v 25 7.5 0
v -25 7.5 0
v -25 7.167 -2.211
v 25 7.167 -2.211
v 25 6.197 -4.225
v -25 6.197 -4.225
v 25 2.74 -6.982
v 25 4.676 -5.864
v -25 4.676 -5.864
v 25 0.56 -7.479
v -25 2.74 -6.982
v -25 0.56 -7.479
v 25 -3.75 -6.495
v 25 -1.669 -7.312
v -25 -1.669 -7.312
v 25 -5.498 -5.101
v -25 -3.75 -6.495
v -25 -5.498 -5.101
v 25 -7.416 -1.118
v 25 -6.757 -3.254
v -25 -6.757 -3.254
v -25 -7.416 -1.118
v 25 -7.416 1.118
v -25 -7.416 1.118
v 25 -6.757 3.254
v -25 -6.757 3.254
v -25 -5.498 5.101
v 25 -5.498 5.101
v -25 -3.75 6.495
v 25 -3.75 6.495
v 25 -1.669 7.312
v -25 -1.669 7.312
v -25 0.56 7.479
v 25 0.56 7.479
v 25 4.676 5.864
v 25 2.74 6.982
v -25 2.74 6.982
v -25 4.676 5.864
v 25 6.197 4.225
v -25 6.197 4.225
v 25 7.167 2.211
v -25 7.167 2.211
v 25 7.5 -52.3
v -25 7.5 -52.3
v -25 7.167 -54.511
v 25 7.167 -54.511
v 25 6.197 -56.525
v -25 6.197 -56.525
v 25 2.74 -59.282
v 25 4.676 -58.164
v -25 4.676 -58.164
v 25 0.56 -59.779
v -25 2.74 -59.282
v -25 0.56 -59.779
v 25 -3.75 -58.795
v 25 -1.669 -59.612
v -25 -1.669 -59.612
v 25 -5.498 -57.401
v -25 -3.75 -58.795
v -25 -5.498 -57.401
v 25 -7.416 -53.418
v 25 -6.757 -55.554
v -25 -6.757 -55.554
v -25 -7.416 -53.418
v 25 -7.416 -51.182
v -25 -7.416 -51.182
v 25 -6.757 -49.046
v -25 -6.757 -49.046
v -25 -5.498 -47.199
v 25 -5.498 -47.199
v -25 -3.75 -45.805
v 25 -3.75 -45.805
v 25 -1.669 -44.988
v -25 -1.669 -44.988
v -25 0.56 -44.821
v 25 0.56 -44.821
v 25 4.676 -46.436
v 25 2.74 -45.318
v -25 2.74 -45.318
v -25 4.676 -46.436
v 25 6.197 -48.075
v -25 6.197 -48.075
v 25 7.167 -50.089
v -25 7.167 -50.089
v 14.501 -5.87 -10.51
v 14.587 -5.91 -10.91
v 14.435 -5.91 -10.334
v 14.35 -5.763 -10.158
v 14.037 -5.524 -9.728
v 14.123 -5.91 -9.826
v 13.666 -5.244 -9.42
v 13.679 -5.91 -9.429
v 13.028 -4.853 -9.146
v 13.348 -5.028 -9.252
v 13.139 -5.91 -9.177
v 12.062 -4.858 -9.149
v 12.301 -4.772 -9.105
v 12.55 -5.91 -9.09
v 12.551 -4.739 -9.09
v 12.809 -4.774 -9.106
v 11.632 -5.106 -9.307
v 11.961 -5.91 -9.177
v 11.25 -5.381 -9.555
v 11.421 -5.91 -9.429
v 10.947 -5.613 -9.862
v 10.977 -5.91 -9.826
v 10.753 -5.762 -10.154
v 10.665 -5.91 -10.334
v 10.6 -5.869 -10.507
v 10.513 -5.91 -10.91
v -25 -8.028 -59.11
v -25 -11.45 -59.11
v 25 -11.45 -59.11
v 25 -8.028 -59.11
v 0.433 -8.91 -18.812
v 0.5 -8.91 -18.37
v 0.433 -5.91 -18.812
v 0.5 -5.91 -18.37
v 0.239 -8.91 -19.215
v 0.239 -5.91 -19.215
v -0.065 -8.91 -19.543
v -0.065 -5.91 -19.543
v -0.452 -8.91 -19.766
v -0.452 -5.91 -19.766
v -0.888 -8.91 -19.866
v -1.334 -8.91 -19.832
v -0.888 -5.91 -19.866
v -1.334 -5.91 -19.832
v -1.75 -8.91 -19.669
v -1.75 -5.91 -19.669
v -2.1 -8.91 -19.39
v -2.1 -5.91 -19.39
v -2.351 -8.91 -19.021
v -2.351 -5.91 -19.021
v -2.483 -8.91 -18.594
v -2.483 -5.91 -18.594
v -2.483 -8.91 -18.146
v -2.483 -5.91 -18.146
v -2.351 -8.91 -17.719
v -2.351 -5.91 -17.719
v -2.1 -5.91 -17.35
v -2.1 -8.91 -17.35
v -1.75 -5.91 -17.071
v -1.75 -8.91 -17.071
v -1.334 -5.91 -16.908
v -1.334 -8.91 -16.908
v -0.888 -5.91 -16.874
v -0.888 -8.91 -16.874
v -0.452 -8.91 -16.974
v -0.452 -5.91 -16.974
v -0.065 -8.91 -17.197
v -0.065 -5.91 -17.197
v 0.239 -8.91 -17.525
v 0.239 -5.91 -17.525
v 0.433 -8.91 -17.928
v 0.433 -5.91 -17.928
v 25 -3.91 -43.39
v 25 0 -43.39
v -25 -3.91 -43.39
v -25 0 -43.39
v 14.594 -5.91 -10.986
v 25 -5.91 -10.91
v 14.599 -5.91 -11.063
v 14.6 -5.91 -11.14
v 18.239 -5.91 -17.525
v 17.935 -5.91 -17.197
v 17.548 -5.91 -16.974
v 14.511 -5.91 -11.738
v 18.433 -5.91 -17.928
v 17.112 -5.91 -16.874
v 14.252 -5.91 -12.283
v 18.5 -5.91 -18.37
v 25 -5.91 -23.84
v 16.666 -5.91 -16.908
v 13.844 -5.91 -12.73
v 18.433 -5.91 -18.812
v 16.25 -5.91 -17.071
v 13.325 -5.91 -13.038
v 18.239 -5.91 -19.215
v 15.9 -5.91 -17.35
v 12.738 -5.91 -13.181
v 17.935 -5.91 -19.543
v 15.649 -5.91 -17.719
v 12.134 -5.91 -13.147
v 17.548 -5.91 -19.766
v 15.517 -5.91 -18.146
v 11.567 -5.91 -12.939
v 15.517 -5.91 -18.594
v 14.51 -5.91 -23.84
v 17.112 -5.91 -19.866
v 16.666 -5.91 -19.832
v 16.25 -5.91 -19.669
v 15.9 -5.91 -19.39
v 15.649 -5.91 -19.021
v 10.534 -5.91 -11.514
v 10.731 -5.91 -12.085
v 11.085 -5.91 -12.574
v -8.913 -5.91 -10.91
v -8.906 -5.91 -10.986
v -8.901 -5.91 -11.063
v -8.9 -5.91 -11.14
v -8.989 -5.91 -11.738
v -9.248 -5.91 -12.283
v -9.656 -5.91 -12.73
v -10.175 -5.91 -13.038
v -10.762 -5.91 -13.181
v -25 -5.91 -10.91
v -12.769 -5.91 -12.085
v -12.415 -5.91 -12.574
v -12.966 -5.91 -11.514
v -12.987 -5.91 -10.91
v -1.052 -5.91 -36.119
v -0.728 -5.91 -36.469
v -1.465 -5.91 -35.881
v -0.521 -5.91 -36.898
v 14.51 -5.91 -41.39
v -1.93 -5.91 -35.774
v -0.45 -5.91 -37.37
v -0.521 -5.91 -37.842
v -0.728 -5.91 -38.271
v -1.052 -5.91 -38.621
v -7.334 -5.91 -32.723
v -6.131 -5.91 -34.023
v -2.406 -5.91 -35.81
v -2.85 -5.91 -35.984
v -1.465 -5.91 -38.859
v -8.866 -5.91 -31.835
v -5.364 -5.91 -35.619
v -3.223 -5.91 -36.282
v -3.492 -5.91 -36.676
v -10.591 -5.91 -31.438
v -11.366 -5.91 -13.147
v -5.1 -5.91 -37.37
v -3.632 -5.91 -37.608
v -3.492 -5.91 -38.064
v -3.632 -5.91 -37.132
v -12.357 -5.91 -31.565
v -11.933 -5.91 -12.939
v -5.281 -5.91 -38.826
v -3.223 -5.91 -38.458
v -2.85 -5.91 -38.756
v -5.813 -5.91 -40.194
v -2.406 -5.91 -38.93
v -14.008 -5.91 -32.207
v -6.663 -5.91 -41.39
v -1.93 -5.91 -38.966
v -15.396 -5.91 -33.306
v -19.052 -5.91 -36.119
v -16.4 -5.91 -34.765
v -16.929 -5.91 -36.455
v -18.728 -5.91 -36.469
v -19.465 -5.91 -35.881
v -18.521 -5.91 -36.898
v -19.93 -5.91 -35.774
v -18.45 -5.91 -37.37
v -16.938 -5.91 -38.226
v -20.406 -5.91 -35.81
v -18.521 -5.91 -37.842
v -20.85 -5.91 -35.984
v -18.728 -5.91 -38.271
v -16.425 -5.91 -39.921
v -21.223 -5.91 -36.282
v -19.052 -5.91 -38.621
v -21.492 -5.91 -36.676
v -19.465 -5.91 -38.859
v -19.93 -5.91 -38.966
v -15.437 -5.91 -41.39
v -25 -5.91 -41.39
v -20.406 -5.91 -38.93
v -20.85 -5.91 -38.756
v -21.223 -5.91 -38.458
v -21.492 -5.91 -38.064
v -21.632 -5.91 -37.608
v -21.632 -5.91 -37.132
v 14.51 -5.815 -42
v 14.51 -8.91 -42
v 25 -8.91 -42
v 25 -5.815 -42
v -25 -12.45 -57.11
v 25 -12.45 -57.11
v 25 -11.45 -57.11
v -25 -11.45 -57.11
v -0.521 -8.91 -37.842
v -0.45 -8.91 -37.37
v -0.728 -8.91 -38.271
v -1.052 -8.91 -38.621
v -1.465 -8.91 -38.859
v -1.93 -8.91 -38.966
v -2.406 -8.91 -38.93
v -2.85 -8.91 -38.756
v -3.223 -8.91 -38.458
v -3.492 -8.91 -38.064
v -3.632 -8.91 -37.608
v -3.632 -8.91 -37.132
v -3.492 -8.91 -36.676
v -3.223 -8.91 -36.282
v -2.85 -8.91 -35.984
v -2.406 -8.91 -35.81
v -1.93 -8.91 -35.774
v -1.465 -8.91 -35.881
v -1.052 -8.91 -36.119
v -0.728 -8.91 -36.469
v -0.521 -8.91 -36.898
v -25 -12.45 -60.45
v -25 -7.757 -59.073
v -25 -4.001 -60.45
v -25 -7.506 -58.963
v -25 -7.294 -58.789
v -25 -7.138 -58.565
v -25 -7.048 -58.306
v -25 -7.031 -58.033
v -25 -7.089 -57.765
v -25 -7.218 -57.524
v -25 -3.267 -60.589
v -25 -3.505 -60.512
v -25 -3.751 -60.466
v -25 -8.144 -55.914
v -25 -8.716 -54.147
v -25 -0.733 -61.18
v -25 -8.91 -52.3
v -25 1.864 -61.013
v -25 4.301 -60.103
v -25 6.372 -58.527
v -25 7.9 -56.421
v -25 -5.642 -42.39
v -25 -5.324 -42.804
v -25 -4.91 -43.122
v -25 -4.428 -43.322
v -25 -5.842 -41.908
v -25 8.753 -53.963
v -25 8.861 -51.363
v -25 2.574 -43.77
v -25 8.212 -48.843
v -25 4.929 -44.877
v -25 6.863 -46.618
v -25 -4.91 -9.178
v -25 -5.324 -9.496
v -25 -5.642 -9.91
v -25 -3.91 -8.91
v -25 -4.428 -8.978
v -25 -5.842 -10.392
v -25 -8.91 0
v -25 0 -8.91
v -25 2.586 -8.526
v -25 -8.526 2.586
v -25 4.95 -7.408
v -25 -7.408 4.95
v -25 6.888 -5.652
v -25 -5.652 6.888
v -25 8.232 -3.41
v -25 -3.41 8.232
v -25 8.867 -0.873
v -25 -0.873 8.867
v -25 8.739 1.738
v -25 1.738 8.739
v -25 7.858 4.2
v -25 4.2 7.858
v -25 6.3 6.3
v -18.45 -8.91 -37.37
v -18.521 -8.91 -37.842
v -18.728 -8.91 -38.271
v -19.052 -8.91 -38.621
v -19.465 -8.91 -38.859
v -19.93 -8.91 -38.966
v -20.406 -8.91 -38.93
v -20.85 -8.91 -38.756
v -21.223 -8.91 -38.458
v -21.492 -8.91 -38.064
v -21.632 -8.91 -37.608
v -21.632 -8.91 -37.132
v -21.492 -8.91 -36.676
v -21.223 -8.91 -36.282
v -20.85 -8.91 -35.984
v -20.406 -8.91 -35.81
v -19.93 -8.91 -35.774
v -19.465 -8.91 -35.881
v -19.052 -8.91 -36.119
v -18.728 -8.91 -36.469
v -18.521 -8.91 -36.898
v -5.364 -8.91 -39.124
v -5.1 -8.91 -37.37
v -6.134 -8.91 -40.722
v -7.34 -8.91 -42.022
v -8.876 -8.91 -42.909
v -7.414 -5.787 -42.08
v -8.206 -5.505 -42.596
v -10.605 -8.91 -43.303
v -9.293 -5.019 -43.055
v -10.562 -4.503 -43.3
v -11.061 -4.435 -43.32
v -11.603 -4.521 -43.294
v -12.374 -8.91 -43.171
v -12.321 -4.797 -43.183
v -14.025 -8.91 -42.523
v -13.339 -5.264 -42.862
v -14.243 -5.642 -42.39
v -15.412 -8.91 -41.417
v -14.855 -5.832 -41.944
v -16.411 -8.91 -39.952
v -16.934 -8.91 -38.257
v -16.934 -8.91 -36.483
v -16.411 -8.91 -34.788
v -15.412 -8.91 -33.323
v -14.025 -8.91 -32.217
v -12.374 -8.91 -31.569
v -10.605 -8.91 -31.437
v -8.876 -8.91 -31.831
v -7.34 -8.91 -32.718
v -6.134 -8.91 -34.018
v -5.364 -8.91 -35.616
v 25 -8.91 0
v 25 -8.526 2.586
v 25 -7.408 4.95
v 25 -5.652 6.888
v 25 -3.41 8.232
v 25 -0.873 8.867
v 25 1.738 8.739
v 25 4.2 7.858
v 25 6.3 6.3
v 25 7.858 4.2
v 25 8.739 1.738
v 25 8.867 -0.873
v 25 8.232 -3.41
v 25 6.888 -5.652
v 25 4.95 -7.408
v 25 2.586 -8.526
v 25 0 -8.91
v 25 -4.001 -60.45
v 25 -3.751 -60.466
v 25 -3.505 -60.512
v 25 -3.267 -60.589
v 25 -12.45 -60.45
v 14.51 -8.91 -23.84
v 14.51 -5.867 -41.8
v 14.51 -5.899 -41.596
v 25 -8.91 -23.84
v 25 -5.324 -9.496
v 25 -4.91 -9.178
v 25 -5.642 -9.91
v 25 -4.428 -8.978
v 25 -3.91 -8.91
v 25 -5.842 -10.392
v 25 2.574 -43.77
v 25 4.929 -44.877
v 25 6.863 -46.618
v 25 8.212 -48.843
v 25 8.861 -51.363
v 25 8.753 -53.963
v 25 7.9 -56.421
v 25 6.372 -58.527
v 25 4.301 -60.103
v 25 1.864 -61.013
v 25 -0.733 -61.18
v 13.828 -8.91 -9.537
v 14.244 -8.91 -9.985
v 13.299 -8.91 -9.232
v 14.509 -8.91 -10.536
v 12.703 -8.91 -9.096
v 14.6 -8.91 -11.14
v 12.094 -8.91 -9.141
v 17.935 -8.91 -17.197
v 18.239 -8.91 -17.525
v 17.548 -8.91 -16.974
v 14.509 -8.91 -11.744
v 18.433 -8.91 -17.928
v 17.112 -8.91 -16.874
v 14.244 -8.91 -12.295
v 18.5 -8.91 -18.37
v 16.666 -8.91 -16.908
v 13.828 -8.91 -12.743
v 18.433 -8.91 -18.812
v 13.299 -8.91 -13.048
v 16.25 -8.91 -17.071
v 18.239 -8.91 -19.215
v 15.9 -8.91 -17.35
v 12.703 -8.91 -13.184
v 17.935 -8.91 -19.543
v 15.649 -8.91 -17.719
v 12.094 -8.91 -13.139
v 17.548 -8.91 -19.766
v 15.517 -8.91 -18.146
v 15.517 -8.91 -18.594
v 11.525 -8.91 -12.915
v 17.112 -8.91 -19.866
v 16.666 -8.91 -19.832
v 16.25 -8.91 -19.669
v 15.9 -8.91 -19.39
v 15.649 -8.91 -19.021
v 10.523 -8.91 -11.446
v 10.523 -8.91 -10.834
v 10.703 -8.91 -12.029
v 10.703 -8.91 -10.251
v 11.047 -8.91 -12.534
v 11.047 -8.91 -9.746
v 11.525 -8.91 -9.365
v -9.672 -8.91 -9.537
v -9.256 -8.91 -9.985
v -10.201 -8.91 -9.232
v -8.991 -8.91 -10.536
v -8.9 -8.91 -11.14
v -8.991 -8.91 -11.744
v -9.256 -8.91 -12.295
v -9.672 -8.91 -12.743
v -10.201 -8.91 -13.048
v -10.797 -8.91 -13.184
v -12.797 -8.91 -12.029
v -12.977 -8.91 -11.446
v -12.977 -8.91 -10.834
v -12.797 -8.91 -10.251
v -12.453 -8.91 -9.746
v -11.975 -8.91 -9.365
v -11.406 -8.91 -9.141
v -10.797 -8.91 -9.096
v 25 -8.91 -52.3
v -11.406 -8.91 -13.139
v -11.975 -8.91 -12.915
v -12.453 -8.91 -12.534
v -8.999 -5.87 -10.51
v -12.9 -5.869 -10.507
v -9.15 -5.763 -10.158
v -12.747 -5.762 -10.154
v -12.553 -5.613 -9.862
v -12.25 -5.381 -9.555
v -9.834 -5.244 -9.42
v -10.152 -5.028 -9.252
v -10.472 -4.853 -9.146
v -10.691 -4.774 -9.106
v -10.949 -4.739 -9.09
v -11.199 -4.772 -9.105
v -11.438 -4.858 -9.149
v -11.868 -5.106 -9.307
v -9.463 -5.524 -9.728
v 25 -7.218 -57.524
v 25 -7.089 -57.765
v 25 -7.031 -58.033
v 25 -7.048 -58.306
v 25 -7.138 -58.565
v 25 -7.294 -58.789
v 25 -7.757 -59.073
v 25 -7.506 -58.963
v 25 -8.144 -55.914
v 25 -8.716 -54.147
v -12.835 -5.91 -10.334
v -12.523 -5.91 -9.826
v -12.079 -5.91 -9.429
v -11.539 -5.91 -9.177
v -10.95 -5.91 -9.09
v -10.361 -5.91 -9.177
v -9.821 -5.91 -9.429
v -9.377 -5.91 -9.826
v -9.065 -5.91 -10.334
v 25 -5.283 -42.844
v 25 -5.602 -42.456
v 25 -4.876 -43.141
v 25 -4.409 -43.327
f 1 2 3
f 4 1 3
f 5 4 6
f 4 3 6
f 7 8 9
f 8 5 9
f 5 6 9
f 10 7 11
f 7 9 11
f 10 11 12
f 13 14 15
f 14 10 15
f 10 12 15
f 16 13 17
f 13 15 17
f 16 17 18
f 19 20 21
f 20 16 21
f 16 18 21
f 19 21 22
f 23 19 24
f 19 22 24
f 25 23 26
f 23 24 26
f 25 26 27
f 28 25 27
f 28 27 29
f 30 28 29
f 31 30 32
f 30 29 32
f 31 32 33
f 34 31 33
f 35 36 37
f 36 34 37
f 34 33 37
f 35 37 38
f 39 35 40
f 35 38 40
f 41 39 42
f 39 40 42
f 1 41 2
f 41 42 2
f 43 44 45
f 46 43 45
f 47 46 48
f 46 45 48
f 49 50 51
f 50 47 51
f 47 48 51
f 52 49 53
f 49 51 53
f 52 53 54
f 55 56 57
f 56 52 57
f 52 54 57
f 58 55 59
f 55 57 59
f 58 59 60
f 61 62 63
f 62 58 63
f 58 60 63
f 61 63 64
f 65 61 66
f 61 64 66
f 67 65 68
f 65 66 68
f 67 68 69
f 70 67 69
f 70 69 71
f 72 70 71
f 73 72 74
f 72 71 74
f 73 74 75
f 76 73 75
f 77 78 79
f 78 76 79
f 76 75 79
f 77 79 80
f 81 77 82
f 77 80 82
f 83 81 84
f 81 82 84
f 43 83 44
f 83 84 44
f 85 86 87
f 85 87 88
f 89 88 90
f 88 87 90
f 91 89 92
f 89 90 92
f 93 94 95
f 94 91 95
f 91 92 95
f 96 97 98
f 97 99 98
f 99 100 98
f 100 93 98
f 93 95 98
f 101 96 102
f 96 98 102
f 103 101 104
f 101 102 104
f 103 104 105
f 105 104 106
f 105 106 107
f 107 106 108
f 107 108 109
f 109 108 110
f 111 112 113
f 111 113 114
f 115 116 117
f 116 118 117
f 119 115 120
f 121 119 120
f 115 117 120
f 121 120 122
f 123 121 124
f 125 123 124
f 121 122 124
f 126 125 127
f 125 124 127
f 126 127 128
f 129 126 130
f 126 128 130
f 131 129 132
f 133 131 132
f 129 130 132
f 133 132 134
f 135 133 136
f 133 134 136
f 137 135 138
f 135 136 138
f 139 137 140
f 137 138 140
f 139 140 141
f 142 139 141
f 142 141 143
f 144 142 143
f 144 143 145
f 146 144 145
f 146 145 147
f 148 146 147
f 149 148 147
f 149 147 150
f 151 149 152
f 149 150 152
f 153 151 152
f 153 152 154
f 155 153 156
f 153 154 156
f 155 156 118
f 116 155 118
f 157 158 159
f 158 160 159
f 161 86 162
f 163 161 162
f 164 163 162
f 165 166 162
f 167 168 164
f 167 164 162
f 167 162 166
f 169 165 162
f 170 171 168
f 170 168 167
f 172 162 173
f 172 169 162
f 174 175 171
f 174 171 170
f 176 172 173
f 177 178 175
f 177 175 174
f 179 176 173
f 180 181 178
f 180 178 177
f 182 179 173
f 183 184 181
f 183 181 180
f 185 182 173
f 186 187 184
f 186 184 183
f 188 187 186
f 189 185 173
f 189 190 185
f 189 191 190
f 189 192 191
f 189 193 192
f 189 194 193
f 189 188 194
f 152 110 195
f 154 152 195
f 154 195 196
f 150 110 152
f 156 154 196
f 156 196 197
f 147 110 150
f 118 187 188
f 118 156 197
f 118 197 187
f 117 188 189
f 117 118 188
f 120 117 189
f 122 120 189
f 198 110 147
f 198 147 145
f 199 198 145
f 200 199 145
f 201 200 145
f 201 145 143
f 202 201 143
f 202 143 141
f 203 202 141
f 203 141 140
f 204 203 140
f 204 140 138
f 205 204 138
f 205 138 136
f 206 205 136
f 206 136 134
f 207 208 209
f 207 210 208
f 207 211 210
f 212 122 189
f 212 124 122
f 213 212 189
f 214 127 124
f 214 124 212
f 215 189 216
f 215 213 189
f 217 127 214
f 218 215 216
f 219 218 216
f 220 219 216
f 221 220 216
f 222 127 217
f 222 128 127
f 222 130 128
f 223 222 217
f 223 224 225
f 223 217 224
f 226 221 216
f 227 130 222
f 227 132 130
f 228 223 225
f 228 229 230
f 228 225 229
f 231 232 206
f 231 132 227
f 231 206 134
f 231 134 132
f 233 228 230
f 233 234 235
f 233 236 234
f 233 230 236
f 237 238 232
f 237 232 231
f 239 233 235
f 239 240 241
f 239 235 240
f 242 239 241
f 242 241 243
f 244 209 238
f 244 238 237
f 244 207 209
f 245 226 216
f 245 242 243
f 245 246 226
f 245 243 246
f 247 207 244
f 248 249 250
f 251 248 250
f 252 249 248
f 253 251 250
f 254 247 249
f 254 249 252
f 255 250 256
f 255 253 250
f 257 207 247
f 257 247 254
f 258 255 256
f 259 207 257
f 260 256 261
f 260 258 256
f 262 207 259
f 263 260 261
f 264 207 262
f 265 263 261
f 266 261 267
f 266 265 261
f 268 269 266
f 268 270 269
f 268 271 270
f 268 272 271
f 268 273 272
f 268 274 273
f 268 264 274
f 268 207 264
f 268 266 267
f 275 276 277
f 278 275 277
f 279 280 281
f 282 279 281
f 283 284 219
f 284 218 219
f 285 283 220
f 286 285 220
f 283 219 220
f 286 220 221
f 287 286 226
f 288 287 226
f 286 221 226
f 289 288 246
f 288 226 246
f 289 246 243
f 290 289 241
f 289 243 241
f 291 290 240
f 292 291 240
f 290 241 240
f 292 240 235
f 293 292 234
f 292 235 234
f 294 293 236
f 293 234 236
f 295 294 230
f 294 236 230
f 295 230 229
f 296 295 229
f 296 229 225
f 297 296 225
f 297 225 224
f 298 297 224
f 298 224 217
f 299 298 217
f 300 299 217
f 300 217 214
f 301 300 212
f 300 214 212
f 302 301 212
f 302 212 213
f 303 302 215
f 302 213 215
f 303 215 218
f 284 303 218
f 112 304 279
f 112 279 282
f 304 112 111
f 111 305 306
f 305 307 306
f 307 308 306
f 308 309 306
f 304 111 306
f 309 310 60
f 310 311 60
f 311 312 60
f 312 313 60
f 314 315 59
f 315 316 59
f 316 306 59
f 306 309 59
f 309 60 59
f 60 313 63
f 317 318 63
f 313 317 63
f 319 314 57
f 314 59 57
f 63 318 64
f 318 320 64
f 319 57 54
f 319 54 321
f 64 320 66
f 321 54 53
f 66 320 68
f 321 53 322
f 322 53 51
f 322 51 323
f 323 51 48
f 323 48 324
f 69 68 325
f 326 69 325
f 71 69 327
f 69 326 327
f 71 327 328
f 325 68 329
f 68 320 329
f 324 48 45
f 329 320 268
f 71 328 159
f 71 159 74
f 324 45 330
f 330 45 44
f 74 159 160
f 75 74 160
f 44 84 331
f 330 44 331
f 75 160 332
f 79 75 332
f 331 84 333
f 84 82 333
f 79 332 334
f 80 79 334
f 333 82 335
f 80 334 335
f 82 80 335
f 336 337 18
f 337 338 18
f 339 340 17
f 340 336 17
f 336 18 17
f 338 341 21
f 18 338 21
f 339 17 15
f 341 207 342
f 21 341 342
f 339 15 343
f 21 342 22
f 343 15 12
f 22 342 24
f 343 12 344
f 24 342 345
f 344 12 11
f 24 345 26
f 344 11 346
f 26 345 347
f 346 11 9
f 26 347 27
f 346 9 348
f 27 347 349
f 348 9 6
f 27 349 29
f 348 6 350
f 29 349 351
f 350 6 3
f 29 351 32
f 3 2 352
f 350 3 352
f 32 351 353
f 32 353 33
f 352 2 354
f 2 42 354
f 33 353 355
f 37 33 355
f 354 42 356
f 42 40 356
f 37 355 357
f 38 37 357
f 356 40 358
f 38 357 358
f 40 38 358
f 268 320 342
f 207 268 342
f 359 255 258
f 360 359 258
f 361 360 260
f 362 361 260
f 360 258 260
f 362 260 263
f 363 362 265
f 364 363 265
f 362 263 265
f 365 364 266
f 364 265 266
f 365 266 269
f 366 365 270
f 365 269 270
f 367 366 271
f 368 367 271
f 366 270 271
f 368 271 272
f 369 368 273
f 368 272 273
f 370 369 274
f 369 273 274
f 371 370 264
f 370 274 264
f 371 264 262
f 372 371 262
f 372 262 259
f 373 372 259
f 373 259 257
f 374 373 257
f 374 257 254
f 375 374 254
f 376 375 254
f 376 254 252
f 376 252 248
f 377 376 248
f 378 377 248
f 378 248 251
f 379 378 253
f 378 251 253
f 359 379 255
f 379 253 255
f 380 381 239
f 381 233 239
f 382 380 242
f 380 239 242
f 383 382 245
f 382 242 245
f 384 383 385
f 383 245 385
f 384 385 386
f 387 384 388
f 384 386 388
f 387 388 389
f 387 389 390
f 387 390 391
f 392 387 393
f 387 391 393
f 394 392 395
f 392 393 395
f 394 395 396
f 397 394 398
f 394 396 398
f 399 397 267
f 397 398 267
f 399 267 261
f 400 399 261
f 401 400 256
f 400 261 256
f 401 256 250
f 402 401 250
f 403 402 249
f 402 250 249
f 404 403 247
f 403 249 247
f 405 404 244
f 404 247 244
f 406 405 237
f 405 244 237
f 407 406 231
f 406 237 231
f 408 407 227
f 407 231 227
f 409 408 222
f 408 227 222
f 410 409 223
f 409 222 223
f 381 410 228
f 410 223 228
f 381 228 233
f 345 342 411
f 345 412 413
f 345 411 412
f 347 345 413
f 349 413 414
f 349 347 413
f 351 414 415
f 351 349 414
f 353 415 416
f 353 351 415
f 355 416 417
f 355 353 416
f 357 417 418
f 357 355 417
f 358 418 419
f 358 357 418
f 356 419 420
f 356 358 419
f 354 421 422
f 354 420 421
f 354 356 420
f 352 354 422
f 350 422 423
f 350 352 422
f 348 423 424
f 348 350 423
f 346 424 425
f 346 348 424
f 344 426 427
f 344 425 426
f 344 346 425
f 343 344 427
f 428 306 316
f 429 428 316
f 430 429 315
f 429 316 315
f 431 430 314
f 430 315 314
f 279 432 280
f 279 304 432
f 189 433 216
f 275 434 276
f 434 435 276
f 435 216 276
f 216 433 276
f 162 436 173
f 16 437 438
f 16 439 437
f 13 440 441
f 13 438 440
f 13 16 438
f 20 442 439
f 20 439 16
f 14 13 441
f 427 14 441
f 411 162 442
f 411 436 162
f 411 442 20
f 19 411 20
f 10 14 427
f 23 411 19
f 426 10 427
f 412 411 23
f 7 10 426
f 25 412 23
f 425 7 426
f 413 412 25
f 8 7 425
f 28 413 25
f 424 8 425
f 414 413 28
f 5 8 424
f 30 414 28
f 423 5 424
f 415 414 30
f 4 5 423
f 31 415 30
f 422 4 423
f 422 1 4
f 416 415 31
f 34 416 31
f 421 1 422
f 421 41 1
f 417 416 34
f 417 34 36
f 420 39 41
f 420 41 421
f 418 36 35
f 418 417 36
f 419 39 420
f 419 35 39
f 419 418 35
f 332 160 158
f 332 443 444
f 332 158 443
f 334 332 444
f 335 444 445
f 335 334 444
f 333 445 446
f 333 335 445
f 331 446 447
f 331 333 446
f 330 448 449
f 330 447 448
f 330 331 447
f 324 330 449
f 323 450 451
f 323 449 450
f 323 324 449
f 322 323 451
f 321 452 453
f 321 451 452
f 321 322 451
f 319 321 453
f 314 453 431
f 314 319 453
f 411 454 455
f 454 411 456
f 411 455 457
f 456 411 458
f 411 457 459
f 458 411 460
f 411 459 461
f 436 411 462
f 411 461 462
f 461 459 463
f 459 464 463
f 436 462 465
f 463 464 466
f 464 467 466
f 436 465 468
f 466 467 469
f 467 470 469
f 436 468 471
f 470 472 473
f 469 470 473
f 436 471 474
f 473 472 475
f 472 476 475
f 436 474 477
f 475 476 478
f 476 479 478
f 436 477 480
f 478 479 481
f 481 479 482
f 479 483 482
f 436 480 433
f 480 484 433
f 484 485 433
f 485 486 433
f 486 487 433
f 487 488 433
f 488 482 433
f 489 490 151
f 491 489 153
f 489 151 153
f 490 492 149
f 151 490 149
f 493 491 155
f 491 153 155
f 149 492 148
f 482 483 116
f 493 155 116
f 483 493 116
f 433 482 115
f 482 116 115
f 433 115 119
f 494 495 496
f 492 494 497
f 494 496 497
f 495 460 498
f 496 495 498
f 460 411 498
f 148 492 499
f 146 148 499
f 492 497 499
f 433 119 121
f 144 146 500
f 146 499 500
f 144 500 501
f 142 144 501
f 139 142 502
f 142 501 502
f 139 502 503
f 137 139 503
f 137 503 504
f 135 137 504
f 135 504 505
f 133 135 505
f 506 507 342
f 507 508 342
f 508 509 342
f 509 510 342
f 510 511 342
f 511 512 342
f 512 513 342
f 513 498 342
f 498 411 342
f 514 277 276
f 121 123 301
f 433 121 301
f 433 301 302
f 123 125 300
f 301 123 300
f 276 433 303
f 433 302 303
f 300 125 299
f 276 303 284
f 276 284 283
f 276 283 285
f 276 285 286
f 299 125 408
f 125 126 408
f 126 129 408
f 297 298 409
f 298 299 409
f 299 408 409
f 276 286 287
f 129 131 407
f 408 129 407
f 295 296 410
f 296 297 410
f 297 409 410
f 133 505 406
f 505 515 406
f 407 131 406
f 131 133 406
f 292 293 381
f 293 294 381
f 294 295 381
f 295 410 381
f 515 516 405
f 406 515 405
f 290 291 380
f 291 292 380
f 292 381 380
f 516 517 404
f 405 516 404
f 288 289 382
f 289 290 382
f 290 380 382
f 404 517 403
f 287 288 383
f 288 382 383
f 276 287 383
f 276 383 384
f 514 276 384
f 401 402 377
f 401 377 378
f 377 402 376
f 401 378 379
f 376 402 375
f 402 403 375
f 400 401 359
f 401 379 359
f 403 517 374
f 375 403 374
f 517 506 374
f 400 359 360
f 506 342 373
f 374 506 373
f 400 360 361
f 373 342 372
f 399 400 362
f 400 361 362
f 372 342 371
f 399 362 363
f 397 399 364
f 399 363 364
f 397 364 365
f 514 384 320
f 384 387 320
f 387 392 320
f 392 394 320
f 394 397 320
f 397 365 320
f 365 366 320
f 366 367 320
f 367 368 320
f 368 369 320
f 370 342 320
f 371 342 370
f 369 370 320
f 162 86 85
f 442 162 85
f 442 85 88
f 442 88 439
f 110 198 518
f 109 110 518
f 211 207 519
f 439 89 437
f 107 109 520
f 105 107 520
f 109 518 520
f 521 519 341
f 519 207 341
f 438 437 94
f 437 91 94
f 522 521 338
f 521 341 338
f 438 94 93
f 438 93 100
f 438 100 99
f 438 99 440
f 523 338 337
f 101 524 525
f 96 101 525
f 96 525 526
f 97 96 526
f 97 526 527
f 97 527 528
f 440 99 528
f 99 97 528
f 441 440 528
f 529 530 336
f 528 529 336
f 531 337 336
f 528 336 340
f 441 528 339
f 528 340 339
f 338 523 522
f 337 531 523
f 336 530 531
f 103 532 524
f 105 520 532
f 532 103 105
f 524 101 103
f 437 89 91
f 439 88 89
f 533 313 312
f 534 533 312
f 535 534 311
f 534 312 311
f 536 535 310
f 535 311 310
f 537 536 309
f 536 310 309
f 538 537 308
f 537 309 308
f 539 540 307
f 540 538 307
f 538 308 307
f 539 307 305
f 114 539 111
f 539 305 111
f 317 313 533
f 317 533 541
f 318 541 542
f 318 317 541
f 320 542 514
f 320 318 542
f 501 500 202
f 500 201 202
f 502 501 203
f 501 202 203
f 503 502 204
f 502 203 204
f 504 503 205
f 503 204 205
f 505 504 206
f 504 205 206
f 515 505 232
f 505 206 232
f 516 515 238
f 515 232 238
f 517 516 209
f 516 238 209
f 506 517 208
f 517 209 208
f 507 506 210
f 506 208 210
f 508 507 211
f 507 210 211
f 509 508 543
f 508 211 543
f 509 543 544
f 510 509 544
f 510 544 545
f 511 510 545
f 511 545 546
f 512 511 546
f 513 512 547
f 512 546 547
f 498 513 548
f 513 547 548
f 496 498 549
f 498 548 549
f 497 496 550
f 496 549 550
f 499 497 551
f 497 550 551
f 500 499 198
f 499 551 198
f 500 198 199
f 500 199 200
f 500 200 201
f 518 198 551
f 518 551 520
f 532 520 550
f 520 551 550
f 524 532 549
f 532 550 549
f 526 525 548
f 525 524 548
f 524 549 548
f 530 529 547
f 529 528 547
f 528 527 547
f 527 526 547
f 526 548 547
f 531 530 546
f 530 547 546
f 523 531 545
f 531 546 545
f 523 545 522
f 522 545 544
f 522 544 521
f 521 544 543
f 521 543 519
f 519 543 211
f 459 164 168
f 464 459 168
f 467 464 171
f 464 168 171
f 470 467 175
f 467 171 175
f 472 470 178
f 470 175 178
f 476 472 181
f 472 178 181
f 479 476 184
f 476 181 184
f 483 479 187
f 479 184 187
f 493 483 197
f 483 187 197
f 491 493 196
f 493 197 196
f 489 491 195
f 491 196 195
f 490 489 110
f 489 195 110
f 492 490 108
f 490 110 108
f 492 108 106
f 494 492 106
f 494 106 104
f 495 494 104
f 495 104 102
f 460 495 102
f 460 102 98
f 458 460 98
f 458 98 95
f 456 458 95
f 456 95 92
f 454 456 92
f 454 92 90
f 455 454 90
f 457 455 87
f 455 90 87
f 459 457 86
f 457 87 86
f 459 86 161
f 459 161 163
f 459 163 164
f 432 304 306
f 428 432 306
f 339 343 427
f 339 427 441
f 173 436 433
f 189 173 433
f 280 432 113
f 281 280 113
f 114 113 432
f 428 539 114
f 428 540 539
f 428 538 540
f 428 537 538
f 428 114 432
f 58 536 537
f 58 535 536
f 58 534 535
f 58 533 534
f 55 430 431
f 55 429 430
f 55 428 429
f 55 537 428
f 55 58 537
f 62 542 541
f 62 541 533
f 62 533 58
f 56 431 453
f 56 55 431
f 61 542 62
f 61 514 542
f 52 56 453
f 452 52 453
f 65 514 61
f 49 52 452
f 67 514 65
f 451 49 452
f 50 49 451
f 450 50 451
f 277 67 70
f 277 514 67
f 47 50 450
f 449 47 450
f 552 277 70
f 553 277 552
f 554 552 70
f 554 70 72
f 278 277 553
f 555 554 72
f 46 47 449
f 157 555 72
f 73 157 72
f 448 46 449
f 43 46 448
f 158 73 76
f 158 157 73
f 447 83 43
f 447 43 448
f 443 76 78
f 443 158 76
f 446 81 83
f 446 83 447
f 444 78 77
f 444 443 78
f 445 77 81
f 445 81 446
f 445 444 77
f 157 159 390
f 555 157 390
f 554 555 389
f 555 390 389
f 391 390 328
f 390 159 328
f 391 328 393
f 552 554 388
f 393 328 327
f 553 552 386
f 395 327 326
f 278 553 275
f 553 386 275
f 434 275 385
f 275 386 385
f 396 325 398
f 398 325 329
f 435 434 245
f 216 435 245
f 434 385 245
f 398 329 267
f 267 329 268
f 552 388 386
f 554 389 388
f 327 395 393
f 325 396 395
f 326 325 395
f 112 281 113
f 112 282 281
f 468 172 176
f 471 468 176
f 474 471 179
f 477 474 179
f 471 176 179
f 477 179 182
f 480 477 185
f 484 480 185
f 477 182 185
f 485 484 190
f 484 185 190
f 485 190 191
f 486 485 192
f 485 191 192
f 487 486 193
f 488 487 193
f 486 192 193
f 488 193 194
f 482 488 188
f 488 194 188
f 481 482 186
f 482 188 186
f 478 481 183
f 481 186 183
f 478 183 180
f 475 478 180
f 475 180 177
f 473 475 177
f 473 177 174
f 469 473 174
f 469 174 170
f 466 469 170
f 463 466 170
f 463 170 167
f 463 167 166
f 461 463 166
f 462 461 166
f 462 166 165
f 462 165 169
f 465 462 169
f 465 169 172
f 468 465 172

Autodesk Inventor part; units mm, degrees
ref_plane "YZ Plane" through (0, 0, 0) normal (1, 0, 0) x (0, 1, 0)
ref_plane "XZ Plane" through (0, 0, 0) normal (0, 1, 0) x (-1, 0, 0)
ref_plane "XY Plane" through (0, 0, 0) normal (0, 0, 1) x (1, 0, 0)
sketch "Эскиз1" plane through (0, 0, 0) normal (1, 0, 0) x (0, 1, 0)
  line L0 (0, 0) -> (143.27187, 0) construction
  line L1 (0, 0) -> (0, -170.504512) construction
  arc A0 (0, -8.91) -> (-8.91, 0) centre (0, 0) ccw
  circle A1 centre (0, -52.3) radius 7.5
  circle A2 centre (0, 0) radius 7.5
  line L2 (-8.91, 0) -> (-8.91, -52.3)
  line L3 (-5.91, -10.91) -> (-5.91, -41.39)
  line L4 (0, -8.91) -> (-3.91, -8.91)
  line L5 (0, -43.39) -> (-3.91, -43.39)
  line L6 (-12.45, -60.45) -> (-12.45, -57.11)
  line L7 (-12.45, -57.11) -> (-11.45, -57.11)
  line L8 (-11.45, -57.11) -> (-11.45, -59.11)
  line L9 (-11.45, -59.11) -> (-8.0282, -59.11)
  arc A3 (-8.91, -52.3) -> (-7.218089, -57.523724) centre (0, -52.3) ccw
  arc A4 (-3.267299, -60.589322) -> (0, -43.39) centre (0, -52.3) ccw
  circle A5 centre (0, 0) radius 4 construction
  line L10 (0, 4) -> (-17.853128, 4) construction
  line L11 (-17.853128, 4) -> (-17.853128, -60.45) construction
  line L12 (-17.853128, -60.45) -> (-12.45, -60.45) construction
  line L13 (-12.45, -60.45) -> (-4.0007, -60.45)
  arc A6 (-8.0282, -59.11) -> (-7.218089, -57.523724) centre (-8.0282, -58.11) ccw
  arc A7 (-5.91, -41.39) -> (-3.91, -43.39) centre (-3.91, -41.39) ccw
  arc A8 (-3.91, -8.91) -> (-5.91, -10.91) centre (-3.91, -10.91) ccw
  arc A9 (-3.267299, -60.589322) -> (-4.0007, -60.45) centre (-4.0007, -62.45) ccw
  point P0 (-5.91, -43.39)
  point P1 (-5.91, -8.91)
  point P2 (0, -61.21)
  point P3 (-5.745607, -59.11)
  point P4 (-3.600778, -60.45)
  dimension "d34" = 8
  dimension "d0" = 17.82
  dimension "d2" = 15
  dimension "d3" = 15
  dimension "d4" = 52.3
  dimension "d5" = 3
  dimension "d9" = 1
  dimension "d11" = 8.91
  dimension "d12" = 8.91
  dimension "d13" = 3.54
  dimension "d35" = 64.45
  dimension "d36" = 3.34
  dimension "d37" = 1.34
  dimension "d38" = 1
  dimension "d39" = 2
  dimension "d40" = 2
  dimension "d41" = 2
  dimension "d42" = 63.11
  dimension "d43" = 70.12
extrude "Выдавливание1" add sketch "Эскиз1" along normal mid plane 50
sketch "Эскиз2" plane through (-25, -5.91, -8.91) normal (0, 1, 0) x (1, 0, 0)
  circle A0 centre (13.95, 28.46) radius 5.95
  line L0 (4.95, 28.46) -> (13.95, 28.46) construction
  line L1 (13.95, 28.46) -> (24.436318, 28.46) construction
  circle A1 centre (4.95, 28.46) radius 1.6
  circle A2 centre (22.95, 28.46) radius 1.6
  line L2 (13.95, 28.46) -> (13.95, 32.27883)
  circle A3 centre (4.95, 28.46) radius 1.455 construction
  circle A4 centre (22.95, 28.46) radius 1.455 construction
  line L3 (0, 5.642815) -> (0, 38.122815) construction
  line L4 (50, -8.91) -> (50, 43.39) construction
  line L5 (50, 14.93) -> (39.51, 14.93)
  line L6 (39.51, 14.93) -> (39.51, 33.09)
  line L7 (39.51, 33.09) -> (50, 33.09)
  line L8 (50, 33.09) -> (50, 14.93)
  line L9 (0, -18.82) -> (50, -18.82) construction
  line L10 (50, 43.39) -> (2.383382, 43.39)
  line L11 (50, -17.82) -> (50, 0)
  line L12 (50, -17.82) -> (50, 0)
  line L13 (50, -8.91) -> (53.294914, -8.91)
  line L14 (50, -12.91) -> (54.162489, -12.91)
  line L15 (0, 52.3) -> (50, 52.3)
  dimension "d15" = 3.2
  dimension "d16" = 3.2
  dimension "d17" = 2.91
  dimension "d18" = 2.91
  dimension "d21" = 18
  dimension "d22" = 11.9
  dimension "d23" = 8
  dimension "d25" = 39.51
  dimension "d27" = 18.16
  dimension "d44" = 17.82
  dimension "d45" = 8.91
  dimension "d46" = 8.91
  dimension "d48" = 4
  dimension "d49" = 46
  dimension "d50" = 10.49
  dimension "d51" = 19.61
  dimension "d52" = 17.89
extrude "Выдавливание2" cut sketch "Эскиз2" along normal mid plane 50
sketch "Эскиз4" plane through (-25, -5.91, -10.91) normal (0, 1, 0) x (1, 0, 0)
  line L0 (14.05, 0.23) -> (37.55, 0.23) construction
  circle A0 centre (14.05, 0.23) radius 2.05
  circle A1 centre (37.55, 0.23) radius 2.05
  line L1 (0, -19.82) -> (50, -19.82) construction
  line L2 (0, 0) -> (0, 30.48) construction
  line L3 (50, 12.93) -> (50, 0) projected
  point P0 (25, -10.91)
  dimension "d53" = 4.1
  dimension "d54" = 4.1
  dimension "d57" = 18
  dimension "d61" = 19.4
  dimension "d63" = 14.05
  dimension "d65" = 23.5
extrude "Выдавливание3" cut sketch "Эскиз4" along normal mid plane 50
sketch "Эскиз6" plane through (-25, -5.91, -10.91) normal (0, 1, 0) x (1, 0, 0)
  circle A0 centre (42, 7.46) radius 1.5
  arc A1 (16.087057, 0) -> (12.012943, 0) centre (14.05, 0.23) ccw
  circle A2 centre (14.05, 0.23) radius 2
  arc A3 (39.587057, 0) -> (35.512943, 0) centre (37.55, 0.23) ccw
  circle A4 centre (37.55, 0.23) radius 2
  circle A5 centre (24, 7.46) radius 1.5
  circle A6 centre (4.95, 26.46) radius 1.129269
  spline S0 degree 3 poles (21.799899, 26.563204) (21.753431, 26.045363) (22.103055, 25.518519) (22.59827, 25.36015) (23.093485, 25.201782) (23.683934, 25.427991) (23.946568, 25.876703) (24.209201, 26.325414) (24.117313, 26.951) (23.73674, 27.305235) (23.356167, 27.659471) (22.725608, 27.706335) (22.296851, 27.41225) (21.868094, 27.118165) (21.684738, 26.513036) (21.878155, 26.03043) (22.071571, 25.547824) (22.622094, 25.236816) (23.135279, 25.320239) (23.648464, 25.403662) (24.072128, 25.873034) (24.102721, 26.392055) (24.133314, 26.911075) (23.767725, 27.426968) (23.267894, 27.570102) (22.768063, 27.713236) (22.184816, 27.469056) (21.936042, 27.012515) (21.687268, 26.555973) (21.798265, 25.933494) (22.189505, 25.591075) (22.580744, 25.248657) (23.212442, 25.221119) (23.631995, 25.528192) (24.051548, 25.835265) (24.216293, 26.445724) (24.008192, 26.922183) (23.800091, 27.398641) (23.240306, 27.692649) (22.729915, 27.593554) (22.219524, 27.494459) (21.810428, 27.012338) (21.795739, 26.492624) (21.78105, 25.972909) (22.162261, 25.468451) (22.66624, 25.340686) (23.170219, 25.212921) (23.745717, 25.474842) (23.980398, 25.938786) (24.215078, 26.40273) (24.085076, 27.021519) (23.683537, 27.3518) (23.281998, 27.68208) (22.649753, 27.690266) (22.239798, 27.370492) (21.829842, 27.050718) (21.683864, 26.435502) (21.906453, 25.965638) (22.129043, 25.495774) (22.697567, 25.219041) (23.204685, 25.333715) (23.711803, 25.448389) (24.105947, 25.942808) (24.104719, 26.462729) (24.10349, 26.982649) (23.707014, 27.475201) (23.199359, 27.587476) (22.691705, 27.699752) (22.124496, 27.420335) (21.904129, 26.949424) (21.683762, 26.478514) (21.832647, 25.863994) (22.244109, 25.546162) (22.655571, 25.228329) (23.28777, 25.239503) (23.687744, 25.571677) (24.087717, 25.903851) (24.214793, 26.523248) (23.977923, 26.986078) (23.741053, 27.448907) (23.164323, 27.708105) (22.660954, 27.57796) (22.157584, 27.447815) (21.778761, 26.94156) (21.795906, 26.421922) (21.813051, 25.902283) (22.224421, 25.4221) (22.735274, 25.325418) (23.246128, 25.228736) (23.804518, 25.525387) (24.010365, 26.002824) (24.216211, 26.48026) (24.048583, 27.089934) (23.627584, 27.39502) (23.206584, 27.700107) (22.575023, 27.669584) (22.185407, 27.325321) (21.79579, 26.981057) (21.687736, 26.35806) (21.938665, 25.9027) (22.189593, 25.447339) (22.773988, 25.205918) (23.273137, 25.351413) (23.772286, 25.496907) (24.135433, 26.014522) (24.102387, 26.533393) (24.069342, 27.052263) (23.643464, 27.519627) (23.12989, 27.600624) (22.616316, 27.681621) (22.06727, 27.368014) (21.876136, 26.8845) (21.685002, 26.400985) (21.871217, 25.796729) (22.301359, 25.504674) (22.731501, 25.212619) (23.361832, 25.262462) (23.740726, 25.618492) (24.119621, 25.974522) (24.208551, 26.600535) (23.9438, 27.048001) (23.679048, 27.495466) (23.087537, 27.718883) (22.593076, 27.558175) (22.098615, 27.397467) (21.751485, 26.868978) (21.8004, 26.351362) (21.849315, 25.833747) (22.289301, 25.37964) (22.805114, 25.314404) (23.320926, 25.249168) (23.860114, 25.579436) (24.036356, 26.068575) (24.212598, 26.557715) (24.007972, 27.155986) (23.56909, 27.434736) (23.130209, 27.713486) (22.5017, 27.644368) (22.133882, 27.276906) (21.961347, 27.104537) (21.845629, 26.876206) (21.808638, 26.635144) knots 2.61665571 2.61665571 2.61665571 2.61665571 3.96742673 3.96742673 3.96742673 5.31819776 5.31819776 5.31819776 6.66896878 6.66896878 6.66896878 8.01973981 8.01973981 8.01973981 9.37051084 9.37051084 9.37051084 10.72128186 10.72128186 10.72128186 12.07205289 12.07205289 12.07205289 13.42282392 13.42282392 13.42282392 14.77359494 14.77359494 14.77359494 16.12436597 16.12436597 16.12436597 17.475137 17.475137 17.475137 18.82590802 18.82590802 18.82590802 20.17667905 20.17667905 20.17667905 21.52745007 21.52745007 21.52745007 22.8782211 22.8782211 22.8782211 24.22899213 24.22899213 24.22899213 25.57976315 25.57976315 25.57976315 26.93053418 26.93053418 26.93053418 28.28130521 28.28130521 28.28130521 29.63207623 29.63207623 29.63207623 30.98284726 30.98284726 30.98284726 32.33361829 32.33361829 32.33361829 33.68438931 33.68438931 33.68438931 35.03516034 35.03516034 35.03516034 36.38593137 36.38593137 36.38593137 37.73670239 37.73670239 37.73670239 39.08747342 39.08747342 39.08747342 40.43824444 40.43824444 40.43824444 41.78901547 41.78901547 41.78901547 43.1397865 43.1397865 43.1397865 44.49055752 44.49055752 44.49055752 45.84132855 45.84132855 45.84132855 47.19209958 47.19209958 47.19209958 48.5428706 48.5428706 48.5428706 49.89364163 49.89364163 49.89364163 51.24441266 51.24441266 51.24441266 52.59518368 52.59518368 52.59518368 53.94595471 53.94595471 53.94595471 55.29672574 55.29672574 55.29672574 56.64749676 56.64749676 56.64749676 57.99826779 57.99826779 57.99826779 59.34903881 59.34903881 59.34903881 60.69980984 60.69980984 60.69980984 62.05058087 62.05058087 62.05058087 63.40135189 63.40135189 63.40135189 64.75212292 64.75212292 64.75212292 65.38573969 65.38573969 65.38573969 65.38573969
  circle A7 centre (22.95, 26.46) radius 1.6
  circle A8 centre (22.95, 26.46) radius 1.154622
  circle A9 centre (4.95, 26.46) radius 2.474109
  line L0 (-39.849119, 12.49) -> (304.043155, 12.49)
  line L1 (39.51, 31.09) -> (50, 31.09)
  line L2 (39.51, 12.93) -> (39.51, 30.48)
  line L3 (50, 12.93) -> (50, 0)
  point P0 (25, -10.91)
  dimension "d66" = 3
  dimension "d67" = 4
  dimension "d68" = 4
  dimension "d70" = 3
  dimension "d72" = 19
  dimension "d73" = 19
  dimension "d74" = 12.26
  dimension "d75" = 30.86
  dimension "d76" = 23.63
  dimension "d78" = 8
  dimension "d79" = 18
extrude "Выдавливание4" cut sketch "Эскиз6" against normal blind 10 contours A0 | A5
properties part number "каретка  хотэнда"
